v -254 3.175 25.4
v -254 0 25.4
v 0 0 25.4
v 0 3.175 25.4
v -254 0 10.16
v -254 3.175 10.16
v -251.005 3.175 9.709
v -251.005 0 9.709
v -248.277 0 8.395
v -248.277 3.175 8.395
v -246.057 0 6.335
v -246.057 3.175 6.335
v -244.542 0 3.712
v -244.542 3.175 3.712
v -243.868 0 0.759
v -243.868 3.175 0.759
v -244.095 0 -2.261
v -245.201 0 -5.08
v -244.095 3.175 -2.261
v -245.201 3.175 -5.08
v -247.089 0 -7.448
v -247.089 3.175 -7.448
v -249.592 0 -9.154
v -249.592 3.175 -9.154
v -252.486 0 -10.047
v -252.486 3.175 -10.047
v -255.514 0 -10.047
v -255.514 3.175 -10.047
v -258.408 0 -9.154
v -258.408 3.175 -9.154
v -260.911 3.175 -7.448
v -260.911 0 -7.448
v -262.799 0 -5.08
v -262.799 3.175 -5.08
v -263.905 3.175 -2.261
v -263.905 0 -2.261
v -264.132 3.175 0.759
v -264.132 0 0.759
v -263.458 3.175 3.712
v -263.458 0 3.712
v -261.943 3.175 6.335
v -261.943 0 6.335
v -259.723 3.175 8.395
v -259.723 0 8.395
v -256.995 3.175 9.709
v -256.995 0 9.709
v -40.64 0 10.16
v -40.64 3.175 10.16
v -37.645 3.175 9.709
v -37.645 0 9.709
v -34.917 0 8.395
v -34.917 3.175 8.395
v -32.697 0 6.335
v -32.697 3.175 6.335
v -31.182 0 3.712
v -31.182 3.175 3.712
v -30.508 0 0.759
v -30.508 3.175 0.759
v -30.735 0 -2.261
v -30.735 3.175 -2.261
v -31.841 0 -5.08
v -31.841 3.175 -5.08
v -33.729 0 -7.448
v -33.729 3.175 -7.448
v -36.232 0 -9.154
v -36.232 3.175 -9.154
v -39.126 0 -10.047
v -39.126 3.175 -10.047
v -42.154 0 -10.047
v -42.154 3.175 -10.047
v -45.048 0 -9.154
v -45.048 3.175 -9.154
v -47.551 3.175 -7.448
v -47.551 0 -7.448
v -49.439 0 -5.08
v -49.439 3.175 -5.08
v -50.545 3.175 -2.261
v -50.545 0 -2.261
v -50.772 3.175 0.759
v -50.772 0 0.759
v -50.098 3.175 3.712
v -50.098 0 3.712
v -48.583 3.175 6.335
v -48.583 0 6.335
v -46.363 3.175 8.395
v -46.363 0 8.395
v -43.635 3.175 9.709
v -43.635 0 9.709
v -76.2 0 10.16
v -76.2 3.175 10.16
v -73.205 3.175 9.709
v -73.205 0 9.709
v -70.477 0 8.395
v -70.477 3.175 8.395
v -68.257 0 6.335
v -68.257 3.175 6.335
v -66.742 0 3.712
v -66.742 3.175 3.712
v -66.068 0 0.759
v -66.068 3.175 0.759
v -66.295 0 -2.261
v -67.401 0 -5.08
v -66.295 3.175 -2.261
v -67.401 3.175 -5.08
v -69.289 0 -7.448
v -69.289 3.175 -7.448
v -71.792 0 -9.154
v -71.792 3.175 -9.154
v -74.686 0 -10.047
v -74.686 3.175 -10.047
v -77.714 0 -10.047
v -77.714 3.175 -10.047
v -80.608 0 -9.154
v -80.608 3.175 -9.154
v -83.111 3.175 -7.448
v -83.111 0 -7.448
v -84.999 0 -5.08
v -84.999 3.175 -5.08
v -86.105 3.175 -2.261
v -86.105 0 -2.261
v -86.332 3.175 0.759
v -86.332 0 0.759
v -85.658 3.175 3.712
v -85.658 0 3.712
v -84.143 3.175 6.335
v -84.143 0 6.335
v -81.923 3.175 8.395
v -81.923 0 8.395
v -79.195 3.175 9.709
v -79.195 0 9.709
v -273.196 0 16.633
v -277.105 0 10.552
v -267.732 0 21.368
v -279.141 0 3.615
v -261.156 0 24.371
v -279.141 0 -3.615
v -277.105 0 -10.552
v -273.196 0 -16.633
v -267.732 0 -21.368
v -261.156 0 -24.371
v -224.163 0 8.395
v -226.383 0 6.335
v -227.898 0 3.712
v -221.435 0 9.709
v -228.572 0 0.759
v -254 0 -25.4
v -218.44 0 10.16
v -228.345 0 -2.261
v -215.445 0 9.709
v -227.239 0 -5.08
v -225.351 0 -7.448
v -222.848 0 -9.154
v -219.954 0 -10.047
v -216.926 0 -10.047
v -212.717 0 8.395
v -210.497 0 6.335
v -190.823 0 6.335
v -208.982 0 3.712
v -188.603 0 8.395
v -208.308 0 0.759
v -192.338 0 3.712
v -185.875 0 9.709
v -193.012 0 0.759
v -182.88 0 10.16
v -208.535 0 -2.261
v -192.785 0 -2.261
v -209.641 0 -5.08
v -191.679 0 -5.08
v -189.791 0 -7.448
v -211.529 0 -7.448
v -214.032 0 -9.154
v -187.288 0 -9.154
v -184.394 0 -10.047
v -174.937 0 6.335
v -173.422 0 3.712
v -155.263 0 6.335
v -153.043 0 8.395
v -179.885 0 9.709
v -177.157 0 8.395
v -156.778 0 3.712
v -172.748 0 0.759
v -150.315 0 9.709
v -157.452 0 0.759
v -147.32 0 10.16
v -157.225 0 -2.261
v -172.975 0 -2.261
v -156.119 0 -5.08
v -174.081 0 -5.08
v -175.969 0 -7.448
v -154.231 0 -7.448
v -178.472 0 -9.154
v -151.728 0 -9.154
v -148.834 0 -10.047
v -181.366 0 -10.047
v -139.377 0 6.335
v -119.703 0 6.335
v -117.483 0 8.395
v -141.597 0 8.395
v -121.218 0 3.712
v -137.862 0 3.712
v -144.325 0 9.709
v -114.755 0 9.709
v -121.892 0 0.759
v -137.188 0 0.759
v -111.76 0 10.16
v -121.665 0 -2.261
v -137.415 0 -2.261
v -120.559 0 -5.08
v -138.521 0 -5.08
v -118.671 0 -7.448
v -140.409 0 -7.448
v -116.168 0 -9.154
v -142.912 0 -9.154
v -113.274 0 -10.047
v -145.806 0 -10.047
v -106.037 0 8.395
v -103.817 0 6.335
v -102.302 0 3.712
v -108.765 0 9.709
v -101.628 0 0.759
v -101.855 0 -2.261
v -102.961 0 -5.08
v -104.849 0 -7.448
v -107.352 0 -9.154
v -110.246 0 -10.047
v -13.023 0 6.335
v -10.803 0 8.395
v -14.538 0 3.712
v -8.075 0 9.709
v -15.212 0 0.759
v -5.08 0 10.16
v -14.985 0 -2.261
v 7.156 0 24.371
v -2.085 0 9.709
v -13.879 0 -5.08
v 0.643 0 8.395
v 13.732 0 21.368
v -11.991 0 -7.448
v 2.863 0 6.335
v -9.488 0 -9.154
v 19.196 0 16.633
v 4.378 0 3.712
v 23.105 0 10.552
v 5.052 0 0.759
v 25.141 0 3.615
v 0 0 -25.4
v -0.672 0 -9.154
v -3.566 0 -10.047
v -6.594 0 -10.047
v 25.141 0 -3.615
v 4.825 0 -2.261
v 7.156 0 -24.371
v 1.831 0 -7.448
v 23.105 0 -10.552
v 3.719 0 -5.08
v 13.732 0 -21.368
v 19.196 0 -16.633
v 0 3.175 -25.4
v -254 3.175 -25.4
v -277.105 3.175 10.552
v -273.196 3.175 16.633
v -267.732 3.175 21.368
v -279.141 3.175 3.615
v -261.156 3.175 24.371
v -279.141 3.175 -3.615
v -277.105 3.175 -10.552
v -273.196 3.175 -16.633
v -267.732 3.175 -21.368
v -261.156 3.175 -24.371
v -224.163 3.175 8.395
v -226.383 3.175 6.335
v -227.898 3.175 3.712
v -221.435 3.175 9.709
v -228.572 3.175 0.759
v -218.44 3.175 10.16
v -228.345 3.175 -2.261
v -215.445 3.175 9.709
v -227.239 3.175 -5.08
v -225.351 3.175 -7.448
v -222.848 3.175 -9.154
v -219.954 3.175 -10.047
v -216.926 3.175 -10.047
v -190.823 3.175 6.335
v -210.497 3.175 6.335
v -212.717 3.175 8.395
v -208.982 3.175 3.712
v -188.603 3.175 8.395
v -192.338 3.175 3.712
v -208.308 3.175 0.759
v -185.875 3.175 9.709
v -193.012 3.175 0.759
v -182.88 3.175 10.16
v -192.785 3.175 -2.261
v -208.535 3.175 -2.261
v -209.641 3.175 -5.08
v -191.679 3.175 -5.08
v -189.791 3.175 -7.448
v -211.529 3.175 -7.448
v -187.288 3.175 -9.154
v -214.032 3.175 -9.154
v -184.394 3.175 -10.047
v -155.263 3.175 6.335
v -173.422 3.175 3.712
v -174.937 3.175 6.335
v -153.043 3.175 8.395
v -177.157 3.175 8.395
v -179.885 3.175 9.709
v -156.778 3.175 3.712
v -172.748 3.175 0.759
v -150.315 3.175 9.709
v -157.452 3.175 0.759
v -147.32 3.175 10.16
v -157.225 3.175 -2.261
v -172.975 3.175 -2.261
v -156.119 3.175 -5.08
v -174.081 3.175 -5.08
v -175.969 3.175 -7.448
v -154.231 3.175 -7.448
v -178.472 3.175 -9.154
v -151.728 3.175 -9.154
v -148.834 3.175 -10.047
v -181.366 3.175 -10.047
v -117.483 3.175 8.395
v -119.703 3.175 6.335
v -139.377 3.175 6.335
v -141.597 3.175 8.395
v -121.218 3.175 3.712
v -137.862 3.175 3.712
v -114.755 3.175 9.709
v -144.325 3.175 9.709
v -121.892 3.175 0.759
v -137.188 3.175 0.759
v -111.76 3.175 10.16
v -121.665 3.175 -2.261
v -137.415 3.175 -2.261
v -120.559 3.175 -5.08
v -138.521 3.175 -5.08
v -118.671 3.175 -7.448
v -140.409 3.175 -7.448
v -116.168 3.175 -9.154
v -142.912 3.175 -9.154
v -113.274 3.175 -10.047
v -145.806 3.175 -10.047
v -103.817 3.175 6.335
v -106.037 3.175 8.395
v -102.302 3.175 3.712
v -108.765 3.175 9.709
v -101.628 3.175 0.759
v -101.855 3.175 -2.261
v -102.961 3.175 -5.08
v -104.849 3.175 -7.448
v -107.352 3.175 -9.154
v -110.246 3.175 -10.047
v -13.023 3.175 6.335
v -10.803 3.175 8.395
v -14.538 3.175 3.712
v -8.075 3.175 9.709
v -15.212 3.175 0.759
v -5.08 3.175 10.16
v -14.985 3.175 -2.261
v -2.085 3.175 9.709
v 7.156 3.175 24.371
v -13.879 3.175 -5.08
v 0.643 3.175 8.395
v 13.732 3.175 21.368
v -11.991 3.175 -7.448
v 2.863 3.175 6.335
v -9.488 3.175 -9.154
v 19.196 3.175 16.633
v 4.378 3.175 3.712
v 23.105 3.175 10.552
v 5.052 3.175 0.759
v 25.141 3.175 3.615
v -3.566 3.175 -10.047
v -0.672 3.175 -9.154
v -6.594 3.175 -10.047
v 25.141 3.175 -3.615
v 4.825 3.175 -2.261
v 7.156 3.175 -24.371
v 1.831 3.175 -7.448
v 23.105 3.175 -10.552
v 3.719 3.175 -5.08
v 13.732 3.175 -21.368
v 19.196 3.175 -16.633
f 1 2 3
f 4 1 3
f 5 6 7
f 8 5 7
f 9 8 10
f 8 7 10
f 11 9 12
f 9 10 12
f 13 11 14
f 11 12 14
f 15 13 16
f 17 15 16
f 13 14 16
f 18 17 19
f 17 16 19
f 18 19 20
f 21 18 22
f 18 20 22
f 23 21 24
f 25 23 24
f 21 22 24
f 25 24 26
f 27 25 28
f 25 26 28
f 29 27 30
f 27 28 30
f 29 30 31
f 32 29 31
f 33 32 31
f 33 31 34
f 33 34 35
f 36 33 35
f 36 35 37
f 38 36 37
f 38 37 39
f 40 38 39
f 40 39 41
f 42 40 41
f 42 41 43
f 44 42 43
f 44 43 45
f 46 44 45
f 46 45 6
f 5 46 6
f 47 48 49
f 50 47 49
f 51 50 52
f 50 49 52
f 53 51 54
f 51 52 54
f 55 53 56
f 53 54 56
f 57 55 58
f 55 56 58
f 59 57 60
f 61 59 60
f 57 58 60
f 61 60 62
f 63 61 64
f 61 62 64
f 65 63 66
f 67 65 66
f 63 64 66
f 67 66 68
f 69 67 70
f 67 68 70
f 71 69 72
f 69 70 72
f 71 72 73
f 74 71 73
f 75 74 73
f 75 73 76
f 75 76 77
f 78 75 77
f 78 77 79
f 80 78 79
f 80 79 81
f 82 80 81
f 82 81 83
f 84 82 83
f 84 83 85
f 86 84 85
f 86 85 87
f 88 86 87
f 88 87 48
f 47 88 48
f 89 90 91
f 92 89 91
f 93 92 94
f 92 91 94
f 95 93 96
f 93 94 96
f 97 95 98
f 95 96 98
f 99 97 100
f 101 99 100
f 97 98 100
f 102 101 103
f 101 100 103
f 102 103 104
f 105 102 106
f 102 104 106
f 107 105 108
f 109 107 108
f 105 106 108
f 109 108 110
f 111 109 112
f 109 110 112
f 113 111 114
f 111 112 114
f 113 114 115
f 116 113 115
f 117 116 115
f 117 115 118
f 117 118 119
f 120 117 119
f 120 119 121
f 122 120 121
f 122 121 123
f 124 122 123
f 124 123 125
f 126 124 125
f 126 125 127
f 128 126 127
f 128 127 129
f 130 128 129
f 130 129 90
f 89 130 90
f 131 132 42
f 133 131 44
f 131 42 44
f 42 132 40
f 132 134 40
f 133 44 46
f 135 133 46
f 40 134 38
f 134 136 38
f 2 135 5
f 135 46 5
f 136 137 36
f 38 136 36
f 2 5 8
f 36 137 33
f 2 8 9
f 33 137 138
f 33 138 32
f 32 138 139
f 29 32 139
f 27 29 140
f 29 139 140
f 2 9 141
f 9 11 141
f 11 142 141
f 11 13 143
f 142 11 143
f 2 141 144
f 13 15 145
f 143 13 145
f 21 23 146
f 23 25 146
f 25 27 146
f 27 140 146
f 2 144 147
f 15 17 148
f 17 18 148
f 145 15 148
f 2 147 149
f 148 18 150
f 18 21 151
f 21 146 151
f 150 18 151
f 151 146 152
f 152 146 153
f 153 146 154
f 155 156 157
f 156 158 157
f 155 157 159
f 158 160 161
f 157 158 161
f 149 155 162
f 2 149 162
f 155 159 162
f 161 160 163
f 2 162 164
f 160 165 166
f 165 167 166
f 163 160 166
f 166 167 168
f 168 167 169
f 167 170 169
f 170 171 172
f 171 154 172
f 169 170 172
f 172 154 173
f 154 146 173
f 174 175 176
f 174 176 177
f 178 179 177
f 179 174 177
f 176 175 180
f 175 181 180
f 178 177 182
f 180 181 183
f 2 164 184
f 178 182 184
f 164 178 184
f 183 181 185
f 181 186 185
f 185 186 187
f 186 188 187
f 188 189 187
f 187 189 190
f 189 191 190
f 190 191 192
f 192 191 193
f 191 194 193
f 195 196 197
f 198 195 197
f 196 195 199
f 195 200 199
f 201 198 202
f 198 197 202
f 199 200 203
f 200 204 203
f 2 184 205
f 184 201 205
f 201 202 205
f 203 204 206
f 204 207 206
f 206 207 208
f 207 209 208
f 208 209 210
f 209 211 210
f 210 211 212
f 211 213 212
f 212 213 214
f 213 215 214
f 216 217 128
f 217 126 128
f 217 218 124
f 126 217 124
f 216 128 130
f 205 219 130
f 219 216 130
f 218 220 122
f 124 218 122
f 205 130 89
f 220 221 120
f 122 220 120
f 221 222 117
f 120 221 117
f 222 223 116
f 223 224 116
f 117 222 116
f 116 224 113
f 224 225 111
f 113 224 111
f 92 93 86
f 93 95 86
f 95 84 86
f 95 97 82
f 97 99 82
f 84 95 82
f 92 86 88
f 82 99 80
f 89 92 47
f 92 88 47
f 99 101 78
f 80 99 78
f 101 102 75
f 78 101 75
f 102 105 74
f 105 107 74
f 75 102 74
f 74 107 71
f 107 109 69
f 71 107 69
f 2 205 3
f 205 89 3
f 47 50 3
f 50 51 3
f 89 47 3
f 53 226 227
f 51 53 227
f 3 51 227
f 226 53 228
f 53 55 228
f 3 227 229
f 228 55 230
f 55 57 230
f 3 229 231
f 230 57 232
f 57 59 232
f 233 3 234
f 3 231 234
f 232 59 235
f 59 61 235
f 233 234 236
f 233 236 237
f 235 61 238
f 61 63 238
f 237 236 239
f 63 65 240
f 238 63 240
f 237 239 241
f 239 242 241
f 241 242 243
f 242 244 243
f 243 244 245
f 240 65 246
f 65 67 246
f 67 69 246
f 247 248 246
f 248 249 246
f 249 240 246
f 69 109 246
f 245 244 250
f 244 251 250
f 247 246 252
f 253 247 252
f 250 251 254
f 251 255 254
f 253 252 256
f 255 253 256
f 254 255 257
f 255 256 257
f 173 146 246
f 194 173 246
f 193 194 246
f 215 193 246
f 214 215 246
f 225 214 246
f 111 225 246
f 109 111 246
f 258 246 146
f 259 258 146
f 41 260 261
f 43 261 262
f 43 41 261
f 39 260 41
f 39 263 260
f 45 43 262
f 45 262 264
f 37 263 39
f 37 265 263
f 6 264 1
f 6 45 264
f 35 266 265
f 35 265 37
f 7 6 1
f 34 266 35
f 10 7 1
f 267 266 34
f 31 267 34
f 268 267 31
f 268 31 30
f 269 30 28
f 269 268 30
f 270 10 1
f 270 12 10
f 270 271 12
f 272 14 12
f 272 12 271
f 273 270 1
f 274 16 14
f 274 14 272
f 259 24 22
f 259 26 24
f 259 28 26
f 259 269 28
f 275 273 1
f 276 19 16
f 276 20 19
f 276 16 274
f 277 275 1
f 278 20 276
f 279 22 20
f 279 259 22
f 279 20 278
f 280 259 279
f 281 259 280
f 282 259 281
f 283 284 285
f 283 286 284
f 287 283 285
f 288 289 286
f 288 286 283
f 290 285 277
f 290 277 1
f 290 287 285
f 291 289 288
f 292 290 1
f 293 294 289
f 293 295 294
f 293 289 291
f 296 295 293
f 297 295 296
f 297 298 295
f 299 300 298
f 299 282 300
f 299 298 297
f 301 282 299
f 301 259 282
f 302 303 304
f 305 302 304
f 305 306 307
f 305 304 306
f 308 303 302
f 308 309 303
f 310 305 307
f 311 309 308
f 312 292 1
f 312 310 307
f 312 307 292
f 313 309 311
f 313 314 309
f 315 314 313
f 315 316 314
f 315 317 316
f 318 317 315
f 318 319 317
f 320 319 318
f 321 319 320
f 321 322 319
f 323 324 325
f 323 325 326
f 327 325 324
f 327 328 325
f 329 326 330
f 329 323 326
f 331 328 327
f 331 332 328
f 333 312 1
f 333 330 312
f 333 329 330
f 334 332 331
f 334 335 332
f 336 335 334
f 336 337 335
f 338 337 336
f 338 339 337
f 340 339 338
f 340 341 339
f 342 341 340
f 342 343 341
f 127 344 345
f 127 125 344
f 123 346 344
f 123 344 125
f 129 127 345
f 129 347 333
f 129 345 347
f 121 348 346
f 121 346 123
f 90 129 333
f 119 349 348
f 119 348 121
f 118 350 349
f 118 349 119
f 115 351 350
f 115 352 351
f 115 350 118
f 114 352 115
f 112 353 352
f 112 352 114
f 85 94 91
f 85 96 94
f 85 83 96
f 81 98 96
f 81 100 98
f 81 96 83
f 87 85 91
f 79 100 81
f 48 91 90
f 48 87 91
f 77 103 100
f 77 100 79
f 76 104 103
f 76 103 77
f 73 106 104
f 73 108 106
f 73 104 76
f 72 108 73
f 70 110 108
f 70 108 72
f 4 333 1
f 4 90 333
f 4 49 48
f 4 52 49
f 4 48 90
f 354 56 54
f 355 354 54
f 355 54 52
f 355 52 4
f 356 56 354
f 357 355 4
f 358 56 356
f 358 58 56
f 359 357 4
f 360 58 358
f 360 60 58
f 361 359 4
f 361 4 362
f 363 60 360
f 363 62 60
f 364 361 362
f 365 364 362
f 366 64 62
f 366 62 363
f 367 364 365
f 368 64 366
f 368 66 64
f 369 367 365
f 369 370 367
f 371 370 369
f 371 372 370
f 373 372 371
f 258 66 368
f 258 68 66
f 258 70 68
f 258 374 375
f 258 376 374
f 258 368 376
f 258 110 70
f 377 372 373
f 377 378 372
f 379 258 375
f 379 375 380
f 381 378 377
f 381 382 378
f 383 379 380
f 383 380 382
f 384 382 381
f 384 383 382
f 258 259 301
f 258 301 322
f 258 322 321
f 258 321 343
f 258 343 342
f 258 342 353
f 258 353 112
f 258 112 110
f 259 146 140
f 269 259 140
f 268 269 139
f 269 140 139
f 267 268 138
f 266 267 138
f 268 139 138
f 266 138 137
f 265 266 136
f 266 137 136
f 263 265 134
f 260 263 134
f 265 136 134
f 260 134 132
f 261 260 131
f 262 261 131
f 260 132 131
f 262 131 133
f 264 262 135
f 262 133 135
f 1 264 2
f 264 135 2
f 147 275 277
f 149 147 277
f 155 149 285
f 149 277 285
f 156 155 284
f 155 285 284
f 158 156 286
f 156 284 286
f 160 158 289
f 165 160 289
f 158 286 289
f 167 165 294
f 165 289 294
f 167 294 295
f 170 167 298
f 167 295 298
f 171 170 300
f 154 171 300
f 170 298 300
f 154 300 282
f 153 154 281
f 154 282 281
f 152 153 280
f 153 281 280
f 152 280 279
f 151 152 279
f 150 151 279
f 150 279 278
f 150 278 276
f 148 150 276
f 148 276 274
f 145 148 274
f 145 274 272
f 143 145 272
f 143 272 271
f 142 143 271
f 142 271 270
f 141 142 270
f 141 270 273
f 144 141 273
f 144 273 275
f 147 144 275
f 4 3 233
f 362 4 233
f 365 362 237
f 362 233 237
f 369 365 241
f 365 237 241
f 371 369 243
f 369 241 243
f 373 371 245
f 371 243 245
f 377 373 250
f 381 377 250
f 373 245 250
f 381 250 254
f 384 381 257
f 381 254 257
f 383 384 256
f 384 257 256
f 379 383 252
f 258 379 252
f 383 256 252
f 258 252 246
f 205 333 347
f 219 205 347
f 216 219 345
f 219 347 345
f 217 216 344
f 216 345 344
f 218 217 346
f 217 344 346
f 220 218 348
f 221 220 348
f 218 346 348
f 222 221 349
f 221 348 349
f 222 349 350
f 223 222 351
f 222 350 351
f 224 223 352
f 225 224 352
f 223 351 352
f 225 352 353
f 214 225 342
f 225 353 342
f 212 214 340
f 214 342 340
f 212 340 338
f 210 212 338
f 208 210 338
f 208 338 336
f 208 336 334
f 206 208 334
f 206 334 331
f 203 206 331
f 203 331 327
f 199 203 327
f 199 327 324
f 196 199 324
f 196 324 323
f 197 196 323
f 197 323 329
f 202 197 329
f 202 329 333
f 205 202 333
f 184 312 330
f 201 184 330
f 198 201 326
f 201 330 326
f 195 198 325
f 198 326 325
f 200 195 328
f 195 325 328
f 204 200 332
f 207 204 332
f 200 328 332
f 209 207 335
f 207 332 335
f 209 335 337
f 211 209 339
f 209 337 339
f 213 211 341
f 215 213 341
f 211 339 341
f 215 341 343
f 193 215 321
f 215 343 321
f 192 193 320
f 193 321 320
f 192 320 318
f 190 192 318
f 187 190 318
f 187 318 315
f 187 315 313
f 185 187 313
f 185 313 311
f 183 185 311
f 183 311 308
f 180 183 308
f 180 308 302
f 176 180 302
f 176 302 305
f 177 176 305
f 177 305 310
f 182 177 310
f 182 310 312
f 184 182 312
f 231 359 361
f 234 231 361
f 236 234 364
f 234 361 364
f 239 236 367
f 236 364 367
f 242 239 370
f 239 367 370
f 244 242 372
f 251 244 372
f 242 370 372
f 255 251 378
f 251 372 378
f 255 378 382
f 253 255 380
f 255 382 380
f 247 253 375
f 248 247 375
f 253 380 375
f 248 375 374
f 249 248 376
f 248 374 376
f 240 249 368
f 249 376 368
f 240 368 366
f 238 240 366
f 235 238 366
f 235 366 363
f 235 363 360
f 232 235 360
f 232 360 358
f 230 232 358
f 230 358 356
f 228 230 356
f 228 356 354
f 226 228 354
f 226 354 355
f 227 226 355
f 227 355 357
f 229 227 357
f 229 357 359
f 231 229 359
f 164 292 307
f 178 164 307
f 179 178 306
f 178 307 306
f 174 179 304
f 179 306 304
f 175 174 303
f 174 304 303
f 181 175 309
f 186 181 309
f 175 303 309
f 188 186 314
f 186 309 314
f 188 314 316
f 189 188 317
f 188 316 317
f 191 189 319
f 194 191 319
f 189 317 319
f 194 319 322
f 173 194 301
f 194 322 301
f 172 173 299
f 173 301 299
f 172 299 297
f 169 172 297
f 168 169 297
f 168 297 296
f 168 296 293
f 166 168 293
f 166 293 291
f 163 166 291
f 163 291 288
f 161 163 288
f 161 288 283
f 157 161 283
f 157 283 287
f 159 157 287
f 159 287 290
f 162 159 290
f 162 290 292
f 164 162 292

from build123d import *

# Parameters (mm, degrees)
BOSS_EXTRUDE1_DEPTH = 3.175
SKETCH3_R           = 10.16
CUT_EXTRUDE1_DEPTH  = 281.570134948
LPATTERN1_COUNT     = 8
LPATTERN1_PITCH     = 35.56


with BuildPart() as part:
    # Sketch1 → Boss-Extrude1 (new body)
    with BuildSketch(Plane(origin=(0, 0, 0), x_dir=(1, 0, 0), z_dir=(0, 1, 0))):
        with BuildLine():
            Line((0, 25.4), (-254, 25.4))
            ThreePointArc((-254, 25.4), (-279.4, 0), (-254, -25.4))
            Line((-254, -25.4), (0, -25.4))
            ThreePointArc((0, -25.4), (25.4, 0), (0, 25.4))
        make_face()
    extrude(amount=BOSS_EXTRUDE1_DEPTH)

    # Sketch3 → Cut-Extrude1 (cut, through all)
    with BuildSketch(Plane(origin=(0, 3.175, 0), x_dir=(1, 0, 0), z_dir=(0, 1, 0))):
        with Locations(Location((-254, 0, 0), (0, 0, 270))):
            Circle(SKETCH3_R)
    cut_extrude1 = extrude(amount=-CUT_EXTRUDE1_DEPTH, mode=Mode.SUBTRACT)

    # LPattern1: Cut-Extrude1 ×8
    with Locations(*[(i * LPATTERN1_PITCH, 0, 0) for i in range(1, LPATTERN1_COUNT)]):
        add(cut_extrude1, mode=Mode.SUBTRACT)


solid = part.part
